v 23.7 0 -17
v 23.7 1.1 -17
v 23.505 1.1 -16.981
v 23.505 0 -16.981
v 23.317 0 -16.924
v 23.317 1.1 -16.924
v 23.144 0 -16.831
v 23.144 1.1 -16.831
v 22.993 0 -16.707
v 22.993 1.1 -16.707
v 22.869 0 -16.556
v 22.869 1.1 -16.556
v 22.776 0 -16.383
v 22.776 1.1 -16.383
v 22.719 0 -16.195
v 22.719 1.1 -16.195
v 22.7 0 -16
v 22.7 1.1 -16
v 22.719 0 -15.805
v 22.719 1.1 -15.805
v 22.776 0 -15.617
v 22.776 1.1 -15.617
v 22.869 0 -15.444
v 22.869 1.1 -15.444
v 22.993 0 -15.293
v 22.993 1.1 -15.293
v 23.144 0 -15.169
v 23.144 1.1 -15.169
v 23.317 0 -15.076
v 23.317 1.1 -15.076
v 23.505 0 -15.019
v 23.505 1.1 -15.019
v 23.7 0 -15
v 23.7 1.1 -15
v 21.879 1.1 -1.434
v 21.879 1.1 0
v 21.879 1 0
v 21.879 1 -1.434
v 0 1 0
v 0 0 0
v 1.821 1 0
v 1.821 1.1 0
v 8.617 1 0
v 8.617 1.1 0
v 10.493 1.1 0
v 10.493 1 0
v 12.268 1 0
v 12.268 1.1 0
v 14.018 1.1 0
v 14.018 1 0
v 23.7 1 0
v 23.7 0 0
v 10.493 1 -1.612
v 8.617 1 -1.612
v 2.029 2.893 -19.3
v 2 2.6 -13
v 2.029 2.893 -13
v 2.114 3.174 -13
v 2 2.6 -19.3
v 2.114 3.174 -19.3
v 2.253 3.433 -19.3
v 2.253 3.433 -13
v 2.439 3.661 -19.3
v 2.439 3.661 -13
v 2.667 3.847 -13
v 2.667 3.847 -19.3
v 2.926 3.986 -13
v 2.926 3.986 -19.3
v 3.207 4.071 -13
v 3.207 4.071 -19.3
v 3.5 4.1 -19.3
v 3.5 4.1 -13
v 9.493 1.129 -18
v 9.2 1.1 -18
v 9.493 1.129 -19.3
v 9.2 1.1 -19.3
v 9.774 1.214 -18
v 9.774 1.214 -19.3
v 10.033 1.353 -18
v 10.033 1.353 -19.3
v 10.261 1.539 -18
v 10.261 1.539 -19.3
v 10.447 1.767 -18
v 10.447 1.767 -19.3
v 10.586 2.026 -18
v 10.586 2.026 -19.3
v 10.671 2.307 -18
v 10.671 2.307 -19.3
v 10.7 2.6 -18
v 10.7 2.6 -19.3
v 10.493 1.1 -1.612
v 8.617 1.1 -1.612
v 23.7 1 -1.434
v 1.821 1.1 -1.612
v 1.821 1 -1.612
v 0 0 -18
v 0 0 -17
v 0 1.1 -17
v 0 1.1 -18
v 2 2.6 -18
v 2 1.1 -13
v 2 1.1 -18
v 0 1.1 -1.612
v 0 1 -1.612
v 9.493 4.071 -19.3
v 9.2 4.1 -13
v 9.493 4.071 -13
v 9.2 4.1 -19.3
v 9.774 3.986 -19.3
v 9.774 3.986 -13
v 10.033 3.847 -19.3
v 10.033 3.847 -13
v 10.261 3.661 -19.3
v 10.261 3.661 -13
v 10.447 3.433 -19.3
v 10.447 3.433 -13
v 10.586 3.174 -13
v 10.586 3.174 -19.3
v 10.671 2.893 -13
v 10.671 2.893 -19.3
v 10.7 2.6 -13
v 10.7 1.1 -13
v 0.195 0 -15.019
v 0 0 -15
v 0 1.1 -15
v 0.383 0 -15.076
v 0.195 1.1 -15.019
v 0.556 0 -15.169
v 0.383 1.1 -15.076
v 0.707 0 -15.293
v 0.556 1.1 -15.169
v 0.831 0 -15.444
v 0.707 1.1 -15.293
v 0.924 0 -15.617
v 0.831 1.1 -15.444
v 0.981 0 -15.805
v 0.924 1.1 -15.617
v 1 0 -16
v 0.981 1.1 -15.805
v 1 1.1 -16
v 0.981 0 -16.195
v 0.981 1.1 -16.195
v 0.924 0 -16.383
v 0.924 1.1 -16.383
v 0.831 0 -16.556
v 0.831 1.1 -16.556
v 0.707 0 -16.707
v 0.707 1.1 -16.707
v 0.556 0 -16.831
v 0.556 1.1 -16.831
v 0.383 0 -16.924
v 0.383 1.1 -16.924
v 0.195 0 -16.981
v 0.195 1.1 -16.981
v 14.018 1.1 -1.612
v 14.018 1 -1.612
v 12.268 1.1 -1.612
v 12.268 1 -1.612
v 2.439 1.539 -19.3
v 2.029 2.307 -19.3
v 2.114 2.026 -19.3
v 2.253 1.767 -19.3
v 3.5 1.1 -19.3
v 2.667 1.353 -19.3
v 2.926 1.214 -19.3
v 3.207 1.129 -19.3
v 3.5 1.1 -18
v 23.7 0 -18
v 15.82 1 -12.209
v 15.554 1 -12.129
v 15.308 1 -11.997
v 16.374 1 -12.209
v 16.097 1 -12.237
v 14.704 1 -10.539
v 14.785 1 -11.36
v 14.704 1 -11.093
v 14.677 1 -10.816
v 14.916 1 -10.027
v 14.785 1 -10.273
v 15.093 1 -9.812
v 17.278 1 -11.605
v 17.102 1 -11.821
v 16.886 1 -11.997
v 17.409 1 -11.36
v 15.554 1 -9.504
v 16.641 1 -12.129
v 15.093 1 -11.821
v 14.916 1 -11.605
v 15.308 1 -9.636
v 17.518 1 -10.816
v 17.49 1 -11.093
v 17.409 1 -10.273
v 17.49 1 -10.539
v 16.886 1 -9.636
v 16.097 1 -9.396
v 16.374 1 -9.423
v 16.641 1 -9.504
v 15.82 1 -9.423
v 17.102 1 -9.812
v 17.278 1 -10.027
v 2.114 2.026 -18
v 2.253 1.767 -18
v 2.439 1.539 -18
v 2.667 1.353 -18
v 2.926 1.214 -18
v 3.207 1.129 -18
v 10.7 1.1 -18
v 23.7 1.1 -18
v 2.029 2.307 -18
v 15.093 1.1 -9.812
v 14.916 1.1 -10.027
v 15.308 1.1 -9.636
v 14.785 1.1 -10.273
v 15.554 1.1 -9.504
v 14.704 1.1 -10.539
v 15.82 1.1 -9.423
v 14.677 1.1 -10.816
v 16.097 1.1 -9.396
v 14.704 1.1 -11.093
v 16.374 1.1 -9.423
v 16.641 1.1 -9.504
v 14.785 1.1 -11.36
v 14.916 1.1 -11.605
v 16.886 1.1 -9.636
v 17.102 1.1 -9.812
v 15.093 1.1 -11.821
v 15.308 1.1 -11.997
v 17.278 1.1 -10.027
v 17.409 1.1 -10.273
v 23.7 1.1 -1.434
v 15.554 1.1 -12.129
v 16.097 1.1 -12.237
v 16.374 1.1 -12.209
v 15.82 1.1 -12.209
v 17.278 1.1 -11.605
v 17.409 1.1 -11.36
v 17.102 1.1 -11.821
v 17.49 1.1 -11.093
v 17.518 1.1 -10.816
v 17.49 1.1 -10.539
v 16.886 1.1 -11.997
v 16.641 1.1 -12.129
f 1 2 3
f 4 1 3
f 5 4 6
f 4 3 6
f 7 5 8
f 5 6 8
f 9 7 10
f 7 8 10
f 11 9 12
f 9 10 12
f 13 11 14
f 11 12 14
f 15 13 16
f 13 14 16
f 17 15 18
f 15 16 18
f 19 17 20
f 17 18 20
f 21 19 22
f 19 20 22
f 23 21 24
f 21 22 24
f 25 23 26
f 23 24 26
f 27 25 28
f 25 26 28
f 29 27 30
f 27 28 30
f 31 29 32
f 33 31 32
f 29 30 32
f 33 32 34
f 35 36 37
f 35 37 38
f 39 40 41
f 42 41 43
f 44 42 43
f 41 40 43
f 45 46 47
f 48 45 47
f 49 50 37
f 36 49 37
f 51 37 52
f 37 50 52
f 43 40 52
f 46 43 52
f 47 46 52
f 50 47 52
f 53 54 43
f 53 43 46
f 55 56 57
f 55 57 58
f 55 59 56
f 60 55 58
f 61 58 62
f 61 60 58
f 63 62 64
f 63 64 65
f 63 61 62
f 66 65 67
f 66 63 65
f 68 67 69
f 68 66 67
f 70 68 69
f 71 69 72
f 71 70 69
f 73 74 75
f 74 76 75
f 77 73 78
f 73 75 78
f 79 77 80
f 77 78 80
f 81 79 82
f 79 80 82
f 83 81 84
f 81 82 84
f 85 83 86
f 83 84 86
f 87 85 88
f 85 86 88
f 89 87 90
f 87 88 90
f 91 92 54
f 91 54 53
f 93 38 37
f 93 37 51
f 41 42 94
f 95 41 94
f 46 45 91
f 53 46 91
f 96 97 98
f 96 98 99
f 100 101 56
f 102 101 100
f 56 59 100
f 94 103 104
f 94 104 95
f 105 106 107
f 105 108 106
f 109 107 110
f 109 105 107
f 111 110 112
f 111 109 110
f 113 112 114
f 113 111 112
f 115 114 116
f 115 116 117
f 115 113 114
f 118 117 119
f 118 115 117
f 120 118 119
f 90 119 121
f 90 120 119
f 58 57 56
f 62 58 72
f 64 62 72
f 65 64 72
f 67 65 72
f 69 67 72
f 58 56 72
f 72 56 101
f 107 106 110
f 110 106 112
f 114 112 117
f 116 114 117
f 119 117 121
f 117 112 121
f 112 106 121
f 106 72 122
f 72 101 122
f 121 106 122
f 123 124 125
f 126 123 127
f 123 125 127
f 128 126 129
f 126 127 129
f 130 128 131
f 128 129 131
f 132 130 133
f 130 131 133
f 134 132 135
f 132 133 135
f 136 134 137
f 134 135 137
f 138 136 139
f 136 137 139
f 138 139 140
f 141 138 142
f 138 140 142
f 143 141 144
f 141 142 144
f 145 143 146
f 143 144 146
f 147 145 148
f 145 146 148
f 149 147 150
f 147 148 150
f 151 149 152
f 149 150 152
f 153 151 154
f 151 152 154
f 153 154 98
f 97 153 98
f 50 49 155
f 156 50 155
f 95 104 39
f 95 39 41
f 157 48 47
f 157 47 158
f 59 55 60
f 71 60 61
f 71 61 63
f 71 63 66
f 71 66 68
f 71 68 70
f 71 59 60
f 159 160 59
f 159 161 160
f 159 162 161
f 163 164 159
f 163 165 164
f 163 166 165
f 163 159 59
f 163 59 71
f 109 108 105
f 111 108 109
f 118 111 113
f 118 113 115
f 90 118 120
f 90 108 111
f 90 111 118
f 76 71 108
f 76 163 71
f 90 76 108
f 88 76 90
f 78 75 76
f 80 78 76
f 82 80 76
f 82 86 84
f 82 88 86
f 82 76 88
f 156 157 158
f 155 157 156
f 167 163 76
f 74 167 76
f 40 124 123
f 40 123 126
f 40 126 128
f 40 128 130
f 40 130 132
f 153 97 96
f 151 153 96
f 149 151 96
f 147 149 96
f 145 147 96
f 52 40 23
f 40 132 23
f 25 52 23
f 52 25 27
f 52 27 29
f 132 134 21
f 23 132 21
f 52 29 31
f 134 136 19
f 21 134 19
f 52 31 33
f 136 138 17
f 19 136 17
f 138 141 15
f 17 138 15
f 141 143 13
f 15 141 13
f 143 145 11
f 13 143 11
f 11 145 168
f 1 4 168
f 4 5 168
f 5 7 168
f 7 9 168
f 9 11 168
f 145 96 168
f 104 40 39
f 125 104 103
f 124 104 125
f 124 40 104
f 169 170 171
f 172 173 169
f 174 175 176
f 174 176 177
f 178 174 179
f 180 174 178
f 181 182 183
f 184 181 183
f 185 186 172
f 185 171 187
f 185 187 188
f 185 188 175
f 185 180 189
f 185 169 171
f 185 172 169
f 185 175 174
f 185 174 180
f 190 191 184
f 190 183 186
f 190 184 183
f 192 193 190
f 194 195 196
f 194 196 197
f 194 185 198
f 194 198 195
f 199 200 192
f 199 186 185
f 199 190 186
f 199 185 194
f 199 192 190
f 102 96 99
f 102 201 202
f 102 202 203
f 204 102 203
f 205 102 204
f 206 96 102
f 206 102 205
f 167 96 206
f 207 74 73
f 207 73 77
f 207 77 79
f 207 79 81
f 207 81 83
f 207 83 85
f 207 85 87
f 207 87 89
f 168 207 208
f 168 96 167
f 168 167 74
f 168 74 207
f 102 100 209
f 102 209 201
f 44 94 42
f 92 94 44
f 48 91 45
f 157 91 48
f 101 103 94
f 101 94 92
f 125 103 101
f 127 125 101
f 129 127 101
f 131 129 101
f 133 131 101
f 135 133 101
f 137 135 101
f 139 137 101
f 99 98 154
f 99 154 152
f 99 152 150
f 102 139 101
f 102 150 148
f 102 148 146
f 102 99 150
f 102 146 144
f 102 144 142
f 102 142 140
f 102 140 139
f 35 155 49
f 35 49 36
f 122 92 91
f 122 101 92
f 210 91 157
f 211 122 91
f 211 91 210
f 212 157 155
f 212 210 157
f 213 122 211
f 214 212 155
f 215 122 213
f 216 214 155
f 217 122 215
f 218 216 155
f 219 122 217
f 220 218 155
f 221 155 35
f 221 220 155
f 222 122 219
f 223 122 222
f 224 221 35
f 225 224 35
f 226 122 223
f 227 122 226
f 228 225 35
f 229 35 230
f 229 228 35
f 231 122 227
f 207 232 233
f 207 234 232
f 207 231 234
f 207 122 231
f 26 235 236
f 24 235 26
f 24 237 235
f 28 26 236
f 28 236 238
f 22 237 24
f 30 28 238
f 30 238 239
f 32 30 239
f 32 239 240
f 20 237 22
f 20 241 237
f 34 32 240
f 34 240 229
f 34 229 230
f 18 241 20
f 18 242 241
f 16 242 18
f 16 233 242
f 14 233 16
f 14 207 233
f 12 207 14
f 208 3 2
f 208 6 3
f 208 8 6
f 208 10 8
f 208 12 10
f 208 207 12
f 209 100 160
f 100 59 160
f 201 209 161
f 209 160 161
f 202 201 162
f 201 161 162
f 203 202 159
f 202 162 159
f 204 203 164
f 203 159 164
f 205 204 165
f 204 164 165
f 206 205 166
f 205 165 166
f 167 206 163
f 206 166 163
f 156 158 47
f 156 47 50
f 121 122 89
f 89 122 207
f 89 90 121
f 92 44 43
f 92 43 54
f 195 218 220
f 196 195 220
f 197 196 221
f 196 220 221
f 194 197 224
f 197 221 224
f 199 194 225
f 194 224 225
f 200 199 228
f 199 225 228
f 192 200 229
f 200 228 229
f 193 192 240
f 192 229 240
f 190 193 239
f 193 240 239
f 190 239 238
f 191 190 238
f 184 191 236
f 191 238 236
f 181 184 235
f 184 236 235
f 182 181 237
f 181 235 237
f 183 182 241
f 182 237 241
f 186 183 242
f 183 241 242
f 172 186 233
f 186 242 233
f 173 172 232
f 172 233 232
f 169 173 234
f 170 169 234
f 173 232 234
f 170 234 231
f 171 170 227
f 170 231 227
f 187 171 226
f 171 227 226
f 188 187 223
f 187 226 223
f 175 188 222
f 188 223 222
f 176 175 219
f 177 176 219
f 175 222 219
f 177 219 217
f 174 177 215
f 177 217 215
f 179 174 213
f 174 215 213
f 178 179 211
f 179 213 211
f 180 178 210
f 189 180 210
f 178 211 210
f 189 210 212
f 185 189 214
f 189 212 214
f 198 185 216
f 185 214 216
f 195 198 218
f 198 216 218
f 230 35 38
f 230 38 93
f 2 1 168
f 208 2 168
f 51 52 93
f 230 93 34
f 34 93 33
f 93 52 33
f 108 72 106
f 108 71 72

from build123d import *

# Parameters (mm, degrees)
ESBO_O1_W                = 23.7
ESBO_O1_H                = 18
RESSALTO_EXTRUS_O1_DEPTH = 1.1
ESBO_O2_W                = 8.7
ESBO_O2_H                = 6.3
RESSALTO_EXTRUS_O2_DEPTH = 3
FILETE1_R                = 1.5
ESBO_O3_R                = 1.420216844
ESBO_O3_W                = 1.821317375
ESBO_O3_H                = 1.611839717
ESBO_O3_W_2              = 1.876415965
ESBO_O3_W_3              = 1.749631103
ESBO_O3_H_2              = 1.434340909
CORTE_EXTRUS_O1_DEPTH    = 0.1
ESBO_O4_R                = 1
CORTE_EXTRUS_O2_DEPTH    = 31.711235729


with BuildPart() as part:
    # Esboço1 → Ressalto-extrusão1 (new body)
    with BuildSketch(Plane(origin=(0, 0, 0), x_dir=(1, 0, 0), z_dir=(0, 1, 0))):
        with Locations((11.85, 9)):
            Rectangle(ESBO_O1_W, ESBO_O1_H)
    extrude(amount=RESSALTO_EXTRUS_O1_DEPTH)

    # Esboço2 → Ressalto-extrusão2 (add)
    with BuildSketch(Plane(origin=(0, 1.1, 0), x_dir=(1, 0, 0), z_dir=(0, 1, 0))):
        with Locations((6.35, 16.15)):
            Rectangle(ESBO_O2_W, ESBO_O2_H)
    extrude(amount=RESSALTO_EXTRUS_O2_DEPTH)

    # Filete1
    filete1_edges = [part.edges().sort_by_distance(p)[0] for p in [
        (10.7, 1.1, -18.65),
        (2, 1.1, -18.65),
        (10.7, 4.1, -16.15),
        (2, 4.1, -16.15),
    ]]
    fillet(filete1_edges, radius=FILETE1_R - 0.0001)  # a hair under: the kernel refuses the full size

    # Esboço3 → Corte-extrusão1 (cut)
    with BuildSketch(Plane(origin=(0, 1.1, 0), x_dir=(1, 0, 0), z_dir=(0, 1, 0))):
        with Locations(Location((16.097292894, 10.816420735, 0), (0, 0, 270))):
            Circle(ESBO_O3_R)
        with Locations((0.910658688, 0.805919859)):
            Rectangle(ESBO_O3_W, ESBO_O3_H)
        with Locations((9.555193989, 0.805919859)):
            Rectangle(ESBO_O3_W_2, ESBO_O3_H)
        with Locations((13.143205597, 0.805919859)):
            Rectangle(ESBO_O3_W_3, ESBO_O3_H)
        with Locations((22.789341312, 0.717170455)):
            Rectangle(ESBO_O3_W, ESBO_O3_H_2)
    extrude(amount=-CORTE_EXTRUS_O1_DEPTH, mode=Mode.SUBTRACT)

    # Esboço4 → Corte-extrusão2 (cut, through all)
    with BuildSketch(Plane(origin=(0, 1.1, 0), x_dir=(1, 0, 0), z_dir=(0, 1, 0))):
        with Locations((0, 16)):
            Circle(ESBO_O4_R)
        with Locations((23.7, 16)):
            Circle(ESBO_O4_R)
    extrude(amount=-CORTE_EXTRUS_O2_DEPTH, mode=Mode.SUBTRACT)


solid = part.part
